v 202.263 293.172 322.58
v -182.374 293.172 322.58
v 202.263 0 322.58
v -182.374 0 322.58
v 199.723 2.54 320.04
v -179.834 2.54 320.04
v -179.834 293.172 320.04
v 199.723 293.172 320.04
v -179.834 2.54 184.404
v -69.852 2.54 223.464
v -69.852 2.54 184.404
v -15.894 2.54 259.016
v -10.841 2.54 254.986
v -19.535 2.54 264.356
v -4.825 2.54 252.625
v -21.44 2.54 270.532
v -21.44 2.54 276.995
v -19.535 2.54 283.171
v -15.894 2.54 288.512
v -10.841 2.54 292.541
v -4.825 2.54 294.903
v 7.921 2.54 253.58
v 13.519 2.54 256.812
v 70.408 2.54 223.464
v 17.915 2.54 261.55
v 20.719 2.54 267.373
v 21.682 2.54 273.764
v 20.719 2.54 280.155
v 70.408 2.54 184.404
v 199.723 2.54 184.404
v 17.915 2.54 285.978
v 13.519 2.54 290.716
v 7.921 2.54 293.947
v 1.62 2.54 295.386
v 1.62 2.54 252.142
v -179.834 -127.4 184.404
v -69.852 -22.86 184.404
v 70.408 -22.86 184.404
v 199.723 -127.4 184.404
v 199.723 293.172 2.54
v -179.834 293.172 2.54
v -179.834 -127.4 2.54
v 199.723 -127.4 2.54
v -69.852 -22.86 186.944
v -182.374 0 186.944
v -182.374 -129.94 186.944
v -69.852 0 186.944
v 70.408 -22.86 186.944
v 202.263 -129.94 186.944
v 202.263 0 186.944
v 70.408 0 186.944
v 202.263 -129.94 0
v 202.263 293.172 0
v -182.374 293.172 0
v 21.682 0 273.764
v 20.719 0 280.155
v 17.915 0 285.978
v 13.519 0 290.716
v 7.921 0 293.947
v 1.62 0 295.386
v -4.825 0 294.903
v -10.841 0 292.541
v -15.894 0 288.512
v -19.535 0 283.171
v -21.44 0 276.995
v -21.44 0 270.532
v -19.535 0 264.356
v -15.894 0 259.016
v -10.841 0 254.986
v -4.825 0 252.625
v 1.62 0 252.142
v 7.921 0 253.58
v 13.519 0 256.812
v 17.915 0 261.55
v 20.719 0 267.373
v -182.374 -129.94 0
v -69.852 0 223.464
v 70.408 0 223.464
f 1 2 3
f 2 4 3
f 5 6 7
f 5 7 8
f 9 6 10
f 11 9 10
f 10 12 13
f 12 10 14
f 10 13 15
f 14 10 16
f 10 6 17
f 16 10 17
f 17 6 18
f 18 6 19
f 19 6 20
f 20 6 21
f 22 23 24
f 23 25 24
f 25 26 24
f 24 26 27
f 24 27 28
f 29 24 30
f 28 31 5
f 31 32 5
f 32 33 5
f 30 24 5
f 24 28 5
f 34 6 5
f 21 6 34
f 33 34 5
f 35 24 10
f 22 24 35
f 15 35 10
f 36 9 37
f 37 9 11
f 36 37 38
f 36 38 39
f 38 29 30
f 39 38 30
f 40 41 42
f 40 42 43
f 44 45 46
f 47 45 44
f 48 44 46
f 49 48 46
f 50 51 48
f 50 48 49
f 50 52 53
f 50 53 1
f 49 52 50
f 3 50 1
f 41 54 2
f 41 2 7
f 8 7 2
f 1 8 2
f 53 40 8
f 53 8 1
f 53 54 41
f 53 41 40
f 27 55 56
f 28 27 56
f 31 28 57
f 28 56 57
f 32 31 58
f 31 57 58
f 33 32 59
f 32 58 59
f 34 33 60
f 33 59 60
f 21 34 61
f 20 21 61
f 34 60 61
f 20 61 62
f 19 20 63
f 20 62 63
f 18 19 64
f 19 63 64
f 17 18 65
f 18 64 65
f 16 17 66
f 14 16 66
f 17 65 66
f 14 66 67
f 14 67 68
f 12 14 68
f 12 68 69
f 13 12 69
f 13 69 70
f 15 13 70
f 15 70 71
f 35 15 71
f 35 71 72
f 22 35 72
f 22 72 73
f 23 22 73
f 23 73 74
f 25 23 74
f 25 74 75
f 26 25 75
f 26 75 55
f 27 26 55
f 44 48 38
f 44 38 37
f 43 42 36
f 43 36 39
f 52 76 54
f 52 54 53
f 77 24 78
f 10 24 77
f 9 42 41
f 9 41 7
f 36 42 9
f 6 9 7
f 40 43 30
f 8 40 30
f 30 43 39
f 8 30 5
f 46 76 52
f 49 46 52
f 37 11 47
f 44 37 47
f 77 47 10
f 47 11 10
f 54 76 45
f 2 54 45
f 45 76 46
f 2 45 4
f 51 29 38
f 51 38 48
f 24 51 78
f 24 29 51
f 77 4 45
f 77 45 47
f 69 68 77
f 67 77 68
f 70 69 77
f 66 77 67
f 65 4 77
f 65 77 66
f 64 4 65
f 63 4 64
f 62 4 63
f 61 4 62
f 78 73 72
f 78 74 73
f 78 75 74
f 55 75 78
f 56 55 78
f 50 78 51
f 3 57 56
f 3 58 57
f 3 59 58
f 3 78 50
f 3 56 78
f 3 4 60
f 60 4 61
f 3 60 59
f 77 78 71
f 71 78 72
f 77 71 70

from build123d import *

# Parameters (mm, degrees)
F0_W     = 384.636849165
F0_H     = 264.3615156412
F1_DEPTH = 322.58
F2_W     = 384.636849165
F2_H     = 129.9396157265
F3_DEPTH = 135.636
F4_DEPTH = 158.75
F5_T     = -2.54
F6_W     = 140.2605473995
F6_H     = 39.0601313553
F7_DEPTH = 25.4
F8_R     = 21.6824210641
F9_DEPTH = 25.4


with BuildPart() as f1:
    # F0 (on Top) → F1 (new body)
    with BuildSketch(Plane.XY):
        with Locations((9.9443048239, 2.2411420941)):
            Rectangle(F0_W, F0_H)
    extrude(amount=F1_DEPTH)

    # F2 (on face) → F3 (cut)
    with BuildSketch(Plane.XY.offset(322.58)):
        with Locations((9.9443048239, -64.9698078632)):
            Rectangle(F2_W, F2_H)
    extrude(amount=-F3_DEPTH, mode=Mode.SUBTRACT)

    # F4 (add): a face of the model
    f4_faces = [f1.faces().sort_by_distance(p)[0] for p in [
        (9.9443048239, 134.4218999147, 161.29),
    ]]
    extrude(f4_faces, amount=F4_DEPTH)

    # F5
    f5_openings = [f1.faces().sort_by_distance(p)[0] for p in [
        (9.944305, 293.1719, 161.29),
    ]]
    offset(amount=F5_T, openings=f5_openings, kind=Kind.INTERSECTION)

    # F6 (on face) → F7 (cut)
    with BuildSketch(Plane(origin=(0, 2.54, 0), x_dir=(-1, 0, 0), z_dir=(0, 1, 0))):
        with Locations((-0.2779662609, 203.9340656776)):
            Rectangle(F6_W, F6_H)
    extrude(amount=-F7_DEPTH, mode=Mode.SUBTRACT)

    # F8 (on face) → F9 (cut)
    with BuildSketch(Plane.XZ):
        with Locations((0, 273.7638354301)):
            Circle(F8_R)
    extrude(amount=-F9_DEPTH, mode=Mode.SUBTRACT)


solid = f1.part
